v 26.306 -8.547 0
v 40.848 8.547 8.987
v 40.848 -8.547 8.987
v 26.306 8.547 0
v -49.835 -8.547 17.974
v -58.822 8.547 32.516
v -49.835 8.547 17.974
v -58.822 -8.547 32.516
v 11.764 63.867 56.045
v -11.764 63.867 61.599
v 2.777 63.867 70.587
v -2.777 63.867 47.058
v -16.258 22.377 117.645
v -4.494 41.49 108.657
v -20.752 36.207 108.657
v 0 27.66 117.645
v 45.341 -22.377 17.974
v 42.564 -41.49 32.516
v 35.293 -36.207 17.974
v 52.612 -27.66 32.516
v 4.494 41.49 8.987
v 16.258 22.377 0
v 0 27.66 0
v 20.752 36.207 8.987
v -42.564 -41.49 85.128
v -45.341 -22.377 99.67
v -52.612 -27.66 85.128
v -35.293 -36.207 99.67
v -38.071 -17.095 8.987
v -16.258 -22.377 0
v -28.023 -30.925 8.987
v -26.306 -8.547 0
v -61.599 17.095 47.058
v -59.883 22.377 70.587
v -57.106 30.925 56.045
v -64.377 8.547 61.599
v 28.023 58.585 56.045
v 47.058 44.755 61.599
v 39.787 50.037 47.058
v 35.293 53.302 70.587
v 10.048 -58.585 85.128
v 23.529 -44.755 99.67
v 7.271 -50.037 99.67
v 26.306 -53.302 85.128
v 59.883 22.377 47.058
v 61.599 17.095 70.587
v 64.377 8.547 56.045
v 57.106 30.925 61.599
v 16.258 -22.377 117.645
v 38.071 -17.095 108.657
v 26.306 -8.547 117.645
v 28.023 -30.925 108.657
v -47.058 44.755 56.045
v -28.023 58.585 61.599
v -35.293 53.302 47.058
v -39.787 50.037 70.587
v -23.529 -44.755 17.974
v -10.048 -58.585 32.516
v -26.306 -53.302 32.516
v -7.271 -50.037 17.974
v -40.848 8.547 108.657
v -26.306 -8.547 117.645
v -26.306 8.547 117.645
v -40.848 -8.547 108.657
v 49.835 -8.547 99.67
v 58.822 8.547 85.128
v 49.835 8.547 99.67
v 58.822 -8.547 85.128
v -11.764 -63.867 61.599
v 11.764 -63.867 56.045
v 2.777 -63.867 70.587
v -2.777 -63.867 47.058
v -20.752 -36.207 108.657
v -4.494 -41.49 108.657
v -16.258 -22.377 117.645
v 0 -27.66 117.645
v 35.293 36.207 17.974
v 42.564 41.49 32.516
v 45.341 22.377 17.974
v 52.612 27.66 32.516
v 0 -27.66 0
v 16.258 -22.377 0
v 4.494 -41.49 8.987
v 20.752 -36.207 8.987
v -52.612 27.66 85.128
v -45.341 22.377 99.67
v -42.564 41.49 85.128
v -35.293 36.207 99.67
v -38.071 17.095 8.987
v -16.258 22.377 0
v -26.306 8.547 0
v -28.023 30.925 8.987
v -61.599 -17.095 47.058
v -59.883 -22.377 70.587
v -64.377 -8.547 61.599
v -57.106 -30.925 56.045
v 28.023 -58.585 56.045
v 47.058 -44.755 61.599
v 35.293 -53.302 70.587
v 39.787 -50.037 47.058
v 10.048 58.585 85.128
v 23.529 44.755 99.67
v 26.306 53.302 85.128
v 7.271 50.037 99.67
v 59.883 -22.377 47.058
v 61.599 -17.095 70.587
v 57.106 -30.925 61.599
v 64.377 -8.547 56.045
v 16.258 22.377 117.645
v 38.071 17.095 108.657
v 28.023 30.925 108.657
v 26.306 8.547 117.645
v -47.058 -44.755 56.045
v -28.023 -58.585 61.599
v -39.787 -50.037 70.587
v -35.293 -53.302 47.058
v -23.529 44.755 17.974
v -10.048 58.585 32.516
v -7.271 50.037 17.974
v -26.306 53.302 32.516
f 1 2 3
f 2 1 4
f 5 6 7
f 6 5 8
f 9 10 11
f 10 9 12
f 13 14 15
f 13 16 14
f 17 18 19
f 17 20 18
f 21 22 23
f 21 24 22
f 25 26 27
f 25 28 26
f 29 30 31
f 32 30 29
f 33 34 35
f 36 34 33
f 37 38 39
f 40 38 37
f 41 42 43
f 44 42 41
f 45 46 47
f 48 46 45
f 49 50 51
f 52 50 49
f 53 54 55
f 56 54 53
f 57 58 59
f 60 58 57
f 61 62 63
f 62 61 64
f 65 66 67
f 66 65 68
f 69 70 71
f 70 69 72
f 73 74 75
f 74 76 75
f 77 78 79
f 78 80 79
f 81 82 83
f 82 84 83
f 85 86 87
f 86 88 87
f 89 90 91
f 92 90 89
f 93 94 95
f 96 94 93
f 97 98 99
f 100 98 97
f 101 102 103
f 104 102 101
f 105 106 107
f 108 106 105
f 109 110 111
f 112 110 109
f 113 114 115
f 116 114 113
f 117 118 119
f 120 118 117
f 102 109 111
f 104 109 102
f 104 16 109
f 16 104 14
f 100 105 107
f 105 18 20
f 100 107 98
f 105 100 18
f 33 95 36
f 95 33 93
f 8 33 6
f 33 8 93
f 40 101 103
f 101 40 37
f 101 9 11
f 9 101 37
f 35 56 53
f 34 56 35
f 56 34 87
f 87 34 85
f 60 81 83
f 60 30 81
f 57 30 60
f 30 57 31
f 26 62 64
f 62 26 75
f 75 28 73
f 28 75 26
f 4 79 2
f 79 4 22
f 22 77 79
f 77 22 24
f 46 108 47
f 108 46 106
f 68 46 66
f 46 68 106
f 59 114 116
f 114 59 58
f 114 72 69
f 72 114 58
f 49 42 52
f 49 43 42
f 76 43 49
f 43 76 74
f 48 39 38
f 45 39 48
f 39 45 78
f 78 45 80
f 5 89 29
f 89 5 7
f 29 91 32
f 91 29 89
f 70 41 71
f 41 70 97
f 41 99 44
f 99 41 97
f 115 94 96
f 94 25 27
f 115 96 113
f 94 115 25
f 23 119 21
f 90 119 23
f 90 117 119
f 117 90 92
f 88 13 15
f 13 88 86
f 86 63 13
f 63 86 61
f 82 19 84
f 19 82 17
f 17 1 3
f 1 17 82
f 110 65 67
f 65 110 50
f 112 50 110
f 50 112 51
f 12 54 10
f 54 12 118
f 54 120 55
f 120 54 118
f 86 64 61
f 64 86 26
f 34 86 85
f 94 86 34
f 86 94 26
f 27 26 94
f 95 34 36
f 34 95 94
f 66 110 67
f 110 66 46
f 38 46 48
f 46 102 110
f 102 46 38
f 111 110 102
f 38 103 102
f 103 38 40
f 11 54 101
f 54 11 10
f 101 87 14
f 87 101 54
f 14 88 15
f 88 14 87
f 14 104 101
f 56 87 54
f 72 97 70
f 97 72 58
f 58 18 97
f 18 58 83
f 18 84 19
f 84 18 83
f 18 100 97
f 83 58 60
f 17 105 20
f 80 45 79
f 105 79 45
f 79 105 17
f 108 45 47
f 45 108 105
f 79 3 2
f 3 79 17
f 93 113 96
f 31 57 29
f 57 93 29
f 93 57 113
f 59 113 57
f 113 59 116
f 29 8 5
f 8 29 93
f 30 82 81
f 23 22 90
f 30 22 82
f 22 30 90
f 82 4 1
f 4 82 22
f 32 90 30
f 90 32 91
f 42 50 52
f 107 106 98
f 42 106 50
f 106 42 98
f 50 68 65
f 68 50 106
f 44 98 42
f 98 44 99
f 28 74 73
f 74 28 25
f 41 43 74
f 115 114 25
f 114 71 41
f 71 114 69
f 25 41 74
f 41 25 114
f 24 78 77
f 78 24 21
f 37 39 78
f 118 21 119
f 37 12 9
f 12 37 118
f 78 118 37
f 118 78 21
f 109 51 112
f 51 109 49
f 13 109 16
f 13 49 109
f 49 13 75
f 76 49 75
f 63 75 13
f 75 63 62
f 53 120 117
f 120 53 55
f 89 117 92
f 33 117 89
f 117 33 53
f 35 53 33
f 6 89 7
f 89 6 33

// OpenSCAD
// file: numbers.scad
// The number we all love.
gold = (1 + sqrt(5)) / 2;

// Ratio of inner over outer circumscribed radii of the icosahedron.  The
// dodecahedron has the same ratio!
inscribe = sqrt(1/3 + 2/15 * sqrt(5));
// Ratio of face radius to icosahedron radius.
coscribe = sqrt(2/3 - 2/15 * sqrt(5));
// Ratio of dodecahedral mid-edge to vertex radii.  (This is the cosine of half
// the dihedral angle).
dodeca_midscribe = sqrt(1/2 + sqrt(5) / 6);
dodeca_comidscribe = sqrt(1/2 - sqrt(5) / 6);
// Ratio of icosahedral mid-edge to vertex radii.  (This is the cosine of half
// the dihedral angle).
icosa_midscribe = sqrt(1/2 + sqrt(5) / 10);
icosa_comidscribe = sqrt(1/2 - sqrt(5) / 10);

// Relative radii of the icosohedral stellation points.
raw_radius1 = 1;
raw_radius2 = (6 * gold - 3) / 5 * inscribe; // 1.0661408512011674
raw_radius3 = gold * icosa_midscribe;        // 1.3763819204711734
raw_radius4 = sqrt((17 - 4 * gold) / 5);     // 1.451059202444919
raw_radius5 = sqrt(21 + 28 * gold) / 5;      // 1.6285570507046667
raw_radius6 = 3 * inscribe;                  // 2.3839634168752983
raw_radius7 = 1 + 2 * gold;                  // 4.23607
raw_radius8 = sqrt(97 / 5 + 156 / 5 * gold); // 8.359584944780256
assert(abs(raw_radius5 - 1.6285570507046667) < 1e-7);
assert(abs(raw_radius8 - 8.359584944780256) < 1e-7);

// Radius of icosahedron with the vertex definitions we use.
ico_scale = sqrt(2 + gold);
// Actual radii in openscad units of the icosahedral stellation points.
radius1 = ico_scale;
radius2 = raw_radius2 * ico_scale;
radius3 = raw_radius3 * ico_scale;
radius4 = raw_radius4 * ico_scale;
radius5 = raw_radius5 * ico_scale;
radius6 = raw_radius6 * ico_scale;
radius7 = raw_radius7 * ico_scale;
radius8 = raw_radius8 * ico_scale;

identity = [[1,0,0],[0,1,0],[0,0,1]];

// Clockwise around [1,0,gold].
rot5 = [[1/2, gold/2, 1/2/gold],
        [-gold/2, 1/2/gold, 1/2],
        [1/2/gold, -1/2, gold/2]];

rot5_2 = rot5 * rot5;
rot5_3 = rot5_2 * rot5;
rot5_4 = rot5_2 * rot5_2;

rotate5 = [identity, rot5, rot5_2, rot5_3, rot5_4];
// file: stand.scad
// STANDS

// Create a tripod.  This implies that the object is face-up to get the 3-fold
// symmetry about the z-axis.
//
// `strut` is the distance from the z-axis to the support struts, as a fraction
// of radius.  `strut_mm` is the same in mm.  If both are non-zero then they
// are added together.
//
// `length` is the length of the strut, as fraction of radius.  Note that as
// the object is raised 2mm, we also increase the length by 2mm.
//
// `thick` is the radius of the struts.
//
// `base` is the base radius, if larger than the computed one.
//
// `hole` if non-zero is the radius of a circle to remove from the center of the
// base.
//
// `height` is the height of the center of the object, as a ratio of `radius`.
// 2mm is added to this.
module stand_tripod(strut, strut_mm=0, base=0,
                    length=1, height=1, align=[1, 0, 0], hole=0, p=10) {
    stand_generic(
        3, strut, strut_mm, base, length, height, hole, p)
        align_rot(align) faceup() children();
}

module stand_pentapod(strut, strut_mm=0, base=0,
                      length=1, height=1, hole=0, p=10) {
    stand_generic(
        5, strut, strut_mm, base, length, height, hole, p)
        pointup() children();
}

module stand_generic(num, strut, strut_mm=0, base=0,
                     length=1, height=1, hole=0, p=10) {
    if ($piece == p) {
        strut_all = strut * $radius + strut_mm;
        difference() {
            for (i = [1:num]) {
                rotate(i * 360 / num) translate([strut_all, 0, 0])
                    cylinder(r = $stand_diameter / 2, h=$radius * length + 2);
            }
            # translate([0, 0, $radius * height + 2])
                scale($radius) children();
        }
        stand_ring(base, hole, strut_all);
    }
}

module stand_quad(x, y, length=1, height=1, hole=0, knob=false) {
    difference() {
        for (c = [[x, y], [-x, y], [-x, -y], [x, -y]]) {
            translate([c.x * $radius, c.y * $radius, 0])
                cylinder(r = $stand_diameter / 2, h=$radius * length + 2);
        }
        #translate([0, 0, $radius * height + 2])
        scale($radius) children();
    }
    stand_ring(0, 1, norm([x, y]) * $radius);
}

module stand_rhombus(x, y, length=1, height=1) {
    difference() {
        for (c = [[x, 0], [-x, 0], [0, -y], [0, y]])
            translate([c.x * $radius, c.y * $radius, 0])
                cylinder(r = $stand_diameter / 2, h=$radius * length + 2);
        #translate([0, 0, $radius * height + 2])
        scale($radius) children();
    }
    stand_ring(max(x, y), min(x, y), x * $radius);
}

module stand_ring(base, hole, strut_mm) {
    outer = max(base * $radius, abs(strut_mm)) + $stand_diameter / 2;
    inner = min(hole * $radius, abs(strut_mm)) - $stand_diameter / 2;
    rounded_ring(outer, inner, n = $fn * 6);
}

module rounded_ring(outer, inner, height=0, r=2, n=0) {
    rotate_extrude($fn = n ? n : $fn) {
        translate([outer, height]) intersection() {
            circle(r);
            square(r);
        }
        if (inner >= r) translate([inner, height]) intersection() {
                circle(r);
                translate([-r, 0]) square(r);
            }
        if (outer > inner)
            translate([inner, 0]) square([outer - inner, height + r]);
        iinner = inner >= r ? inner - r : inner;
        if (height > 0)
            translate([inner, 0]) square([outer + r - iinner, height]);
    }
}
// main file
use <functions.scad>
use <splitting.scad>
use <stand.scad>
include <numbers.scad>

// Faces are coloured as follows:
// Rhombication squares - green.
// Icosohedral - Yellow.
// Dodecahdral - Magenta.

// Snub triangles - Pink.

// Octohedral - Orange.
// Cubical - Purple.
// Tetrahedral - Lets do red.
// Truncated tetrahedron - red + pink?  Or maybe black for all truncation?

// Index of the object to print.
archimedes = 12;
// Alternatively, you may replace `main();` below with the object you want.

// 0 = raw object, 1, 2... = main printables, 10 = stand.
$piece = 1;

// The overall radius in mm from the center of the piece to its extremities.
$radius = 65.001;
// Many of the dimensions below are scaled by the radius.

// Depth in mm of the hole for post joiners.
$join_depth=5;

// Diameter in mm of the holes for post joiners.
$join_diameter=2.1;
// This should be the diameter of your filament (or whatever you use), plus a
// little.

// Diameter in mm of the stand posts.
// $stand_diameter = 6;

// For stands and joiners.  (Gets multiplied for larger radii).
$fn=20;

// Print pieces face down rather than face-up.
$flip = true;

main();

module main() {
    // 46.9041 gives an edge length of 40.
    if (archimedes == 1) truncated_tetrahedron(); // 50mm
    // Cuboctahedron has inscribe distance of /sqrt(2) for the squares
    // and /sqrt(3/2) for the trianges.  At 50mm, that gives square inscribe
    // radius of 35.3553mm and triangle inscribe 40.8248mm.
    if (archimedes == 2) cuboctahedron(); // 50mm, ins. 35.3553 and 40.8248
    // 52.1005 gives a square inscribe of 35.355.
    if (archimedes == 3) truncated_cube();
    // 52.7045 gives a triangle inscribe of 40.8247
    if (archimedes == 4) truncated_octahedron();
    if (archimedes == 5) rhombi_cuboctahedron(); // 60mm
    // Inscribes: 53.6863 (cube), 58.638 (octohedron), 61.9008 (rhombis)
    if (archimedes == 6) truncated_cuboctahedron(); // 65mm
    if (archimedes == 7) snub_cube();         // 55mm
    // Inscribe 60.7212 for the triangles and 55.2923 for the pentagons.
    if (archimedes == 8) icosidodecahedron(); // 65mm
    // 75mm gives an edge length of 25.2572.
    // 65.9415 gives an decagon inscribe of 55.2923 and edge length 22.2066.
    if (archimedes == 9) truncated_dodecahedron();
    // 66.3659 gives hexagons matching the inscribe of the icosidodecahedron
    // and an edge length of 26.7815.
    if (archimedes == 10) truncated_icosahedron();
    if (archimedes == 11) rhombicosidodecahedron();      // 65mm
    if (archimedes == 12) truncated_icosidodecahedron(); // 90mm
    if (archimedes == 13) snub_dodecahedron();           // 65mm

    // Platonic solids.
    if (archimedes == 21) tetrahedron();
    if (archimedes == 22) plato_cube();
    if (archimedes == 23) octohedron();
    if (archimedes == 24) dodecahedron();
    if (archimedes == 25) icosahedron();

    // 50... for duals.
    if (archimedes == 62) disdyakis_triacontahedron(); // 90mm

    // 101 - 175 for the Skilling numbering of the uniform compounds.
    // 201 - 275 for their duals.
    if (archimedes == 246) two_dodecahedra();
}

// Joiner array item description is [radius,radius_mm,offset,offset_mm] or just
// [radius_mm,offset_mm] with the origin inferred from the signs.
vertical_joiners=[[1, -4, 0, 0], [0, 2.5, 0, 0]];

module truncated_tetrahedron() {
    $join_depth=4;
    a = [3,1,1];
    // Suppress coset reduction on the hexagon.  The order-6 rotation is not
    // in the full rotational symmetry group!
    joiners=[[2.5,4],[-9,-4]];
    face_list = [
        [triangle(a), 4, "grey", 2, [[[2.5,4],[-9,-4]]] ],
        [invert(double(triangle(mz(a)))), -4, "red", 3,
         [[[2.5,-4],[-9,4]], [[-9,4], [-9, -4]]] ]];
    polygon_face_set(face_list, cut = 1 - 14.5 / $radius);
}

module cuboctahedron() {
    p = [0, 1, 1];
    face_list=[
        [zsquare(p), 6, "purple"],
        [triangle(p), 8, "orange"]];

    joiners=[[1, -6.5, -0.5, 10], [1, -6.5, 0.5, -10]];
    polygon_face_set(face_list, joiners=joiners);
}

module truncated_cube() {
    a = [1 + sqrt(2), 1, 1 + sqrt(2)];
    t_joins=[[2.5,  4.7], [-7, -4.7]];
    s_joint=[[2.5, -4.7], [-7,  4.7]];
    s_joins=[[-7, -3], [-7, 3]];
    face_list = [
        [triangle(a), 8, "orange", 3, [t_joins]],
        [octogon(a), 6, "purple", 2, [s_joint, s_joins]]];
    polygon_face_set(face_list);
}

module truncated_octahedron() {
    a = [0, 1, 2];
    face_list = [
        [zsquare(a), 6, "purple"],
        [double(triangle(a)), 8, "orange"]];
    joiners=[[1, -5.5, -0.5, 6], [1, -5.5, 0.5, -6]];
    polygon_face_set(face_list, joiners=joiners);
}


module rhombi_cuboctahedron() {
    a = [1, 1, 1 + sqrt(2)];
    face_list= [
        [triangle(a), 8, "orange"],
        [zsquare(a), 6, "purple"],
        [[a, pls(a), my(pls(a)), my(a)], 12, "green", 4],
        ];
    joiners=[[1, -4.2, -0.5, 10], [1, -4.2, 0.5, -10]];
    polygon_face_set(face_list, joiners=joiners);
}

module truncated_cuboctahedron() {
    q = [1 + sqrt(2), 1, 1 + 2 * sqrt(2)];

    f4 = [q, [q.z, q.y, q.x], [q.z, -q.y, q.x], [q.x, -q.y, q.z]];

    face_list = [
        [f4, 12, "green"],
        [double(triangle(q)), 8, "orange"],
        [octogon(q), 6, "purple"]];

    joiners=[[1, -5.3, -0.5, 6.5], [1, -5.3, 0.5, -6.5], [0, 2.5, 0, 0]];
    polygon_face_set(face_list, joiners=joiners);
}


module snub_cube() {
    function tribo(n, a) = n == 0 ? a : tribo(n - 1, sqrt(1/a + 1 + a));
    t = tribo(22, 1);
    a = [1/t, 1, t];
    face_list=[
        [zsquare(a), 6, "purple"],
        [triangle(a), 8, "orange"],
        [[a, pls(a), rmz(a)], 24, "pink", 4],
        ];
    joiners=[[-5, 10], [-5, -10], [2.5, 0]];
    polygon_face_set(face_list, joiners=joiners);
}

module icosidodecahedron()
{
    q = [gold - 1, 1, gold];

    face_list = [
        [triangle(q), 20, "yellow"],
        [canonvv(pentagon(q)), 12, "magenta"]];

    joiners=[[-5, 10], [-5, -10], [2.5, 0]];
    polygon_face_set(face_list, cut=0.75, joiners=joiners);
}

module truncated_dodecahedron() {
    q = [gold, 2, gold+1];

    face_list = [
        [triangle(q), 20, "yellow"],
        [canonvv(double(pentagon(q))), 12, "magenta"]];

    joiners=[[-5.2, 0], [2.5, 0]];
    polygon_face_set(face_list, joiners=joiners);
}

module truncated_icosahedron() {
    b = [2, gold, 2 * gold + 1];
    joiners=[[-4, -4.8], [-4, 4.8]];
    face_list = [
        [canonvv(pentagon(b)), 12, "magenta", 2],
        [double(triangle(b)), 20, "yellow", 3]];
    polygon_face_set(face_list, cut=0.85, joiners=joiners);
}

module rhombicosidodecahedron() {
    a = [1, 1, 2*gold + 1];

    face_list = [
        [triangle(rot5*a), 20, "yellow"],
        [zsquare(a), 30, "green"],
        [pentagon(a), 12, "magenta"]
        ];

    polygon_face_set(face_list, joiners=vertical_joiners);
}

module truncated_icosidodecahedron() {  // Aka great rhombicosidodecahedron.
    p = [gold-1, gold-1, 3 + gold];

    face_list = [
        [zsquare(p), 30, "green"],
        [canonvv(double(triangle(rot5*p))), 20, "yellow"],
        [canonvv(double(pentagon(p))), 12, "magenta"]];
    polygon_face_set(face_list);
}


// For this guy we give up on canonicalisation and cosets.
module snub_dodecahedron() {
    // ξ ≈ 0.94315125924 from wikipedia.
    epsilon = 0.94315125924;
    p = [
        -gold*gold*gold + gold * epsilon + 2 * gold * epsilon * epsilon,
        (gold + 1) * (1 - epsilon),
        epsilon
        ];

    face_list = [
        [pentagon(p), -12, "magenta"],
        [[p, rz(p), rz(rot5_4 * p)], -60, "pink", 2],
        [triangle(rot5*p), -20, "yellow"]
        ];

    joiners=[[1, -3.5, 0, 0], [0, 2.5, 0, 0]];
    polygon_face_set(face_list, joiners=joiners);
}

module tetrahedron() {
    $join_depth = 4;
    p = [1,1,-1];
    face_list = [[triangle(p), 4, "red", 2]];
    joiners=[[-13.25, 6.5], [-13.25, -6.5]];
    polygon_face_set(face_list, cut=0.7, joiners=joiners);

    if ($piece == 10) {                 // Stand.
        stand_diameter = 10;
        echo($radius * sqrt(8/3));
        target = $radius * sqrt(2)/3 + 0.2;
        sr = stand_diameter / 2;
        arc_radius = target * 2 - sr;
        difference() {
            for (a = [-90, -210, 30]) rotate(a) {
                    rotate([0,90,0]) translate([-arc_radius, -arc_radius-sr, 0])
                        rotate_extrude(angle=150, $fn=$fn * 10)
                        translate([arc_radius, 0])
                        circle(stand_diameter / 2);
                    translate([0, target - arc_radius - sr,
                               sqrt(3) * target + arc_radius])
                        sphere(stand_diameter, $fn=$fn * 5);
                    translate([0, -arc_radius-sr, 0]) sphere(sr, $fn=$fn*2);
                }
            translate([0, 0, sqrt(3) * target + arc_radius]) {
                linear_extrude(10) circle($radius * sqrt(8) / 3, $fn = 3);
            }
            translate([0,0,-sr])
                cube([5 * target, 5 * target, stand_diameter], center=true);
        }
        rounded_ring(outer=arc_radius+sr, inner=arc_radius-sr, n=$fn*5);
    }
    if ($piece == 11) {
        stand_diameter = 8;
        gap = 0.4;
        target = $radius * sqrt(2)/3 + 0.2 - gap;
        angle = 75;
        difference() {
            for (a = [60, 180, -60])
                rotate(a) bent_dumbell(target, stand_diameter, angle, gap);
            translate([0,0,-stand_diameter])
                cube([3 * target, 3 * target, 2 *stand_diameter], center=true);
            translate([0,0, bd_height(target, stand_diameter, angle, gap)])
                linear_extrude(stand_diameter)
                circle($radius * sqrt(8) / 3, $fn = 3);
        }
    }
    module bent_dumbell(target, stand_diameter, angle, gap) {
        c = cos(angle);
        s = sin(angle);
        sr = stand_diameter / 2;
        outer_radius = target / (1 - c);
        mid_radius = outer_radius - sr;
        translate([outer_radius + gap, 0, outer_radius * s])
        rotate([90,0,0]) rotate(180-angle) {
            rotate_extrude(angle=angle*2, $fn=$fn*10)
                translate([mid_radius, 0]) circle(sr);
            translate([outer_radius, 0, 0]) sphere(stand_diameter, $fn=$fn*5);
            rotate(angle*2)
                translate([outer_radius, 0, 0]) sphere(stand_diameter, $fn=$fn*5);
        }
    }
    function bd_height(target, stand_diameter, angle, gap) =
        2 * sin(angle) * target / (1 - cos(angle));
}

module plato_cube() {
    p = [1,1,1];
    face_list = [[zsquare(p), 6, "green", 2]];
    joiners=[[-9, 6], [-9, -6]];
    polygon_face_set(face_list, joiners=joiners);
}

module octohedron() {
    p = [0,0,1];
    face_list = [[triangle(p), 8, "orange", 2]];
    joiners = [[-7.5, 9], [-7.5, -9]];
    polygon_face_set(face_list, joiners=joiners);
}

module dodecahedron() {
    p = [0,gold-1,gold];
    face_list = [[pentagon(p), 12, "magenta", 2]];
    joiners = [[-5, 5], [-5, -5]];
    polygon_face_set(face_list, joiners=joiners);
}

module icosahedron() {
    p = [1,0,gold];
    face_list = [[triangle(p), 20, "yellow", 2]];
    joiners = [[-4.5, 10], [-4.5, -10]];
    polygon_face_set(face_list, joiners=joiners);
}

module disdyakis_triacontahedron() {
    p = [0, 0, 1];
    q = [1, 0, gold] / norm([1, gold]);
    r = [0, gold-1, gold] / norm([gold-1, gold]);
    c = [gold-1, gold-1, gold+3] / norm([gold-1, gold-1, gold+3]);;
    if ($piece == 11) {
        for (v = sixty([p])) translate(v[0]) color("lightgreen") sphere(0.025);
        for (v = twelve([q])) translate(v[0]) color("magenta") sphere(0.025);
        for (v = twenty([r])) translate(v[0]) color("yellow") sphere(0.025);
        for (v = onetwenty([c])) translate(v[0]) color("black") sphere(0.025);
        color("#ffffee", 0.75) sphere(0.9, $fn=100);
        translate(p) color("lightgreen") sphere(0.05);
        translate(q) color("magenta") sphere(0.05);
        translate(r) color("yellow") sphere(0.05);
    }
    face_list = [[[r, q, p], 60, "white", 2],
                 [[p, q, my(r)], 60, "black", 3]];
    polygon_face_set(face_list);
}

module two_dodecahedra() {
    A = [for (r = rotate5) canonv(r * [0, gold-1, gold])];
    factor = $radius / sqrt(3);
    if ($piece == 1) {
        scale(1 / sqrt(3)) twelve() pyramid(A);
        color("red") rotate(90) scale(1 / sqrt(3)) twelve() pyramid(A);
        scale(1/sqrt(3)) {
            color("black") translate([1,-1,1]) sphere(0.1);
            color("black") translate([1,1,1]) sphere(0.1);
            color("black") translate([0,0,gold]) sphere(0.1);
            color("blue") translate([gold-1,0,gold]) sphere(0.1);
        }
    }
    if ($piece == 2) {
        p = factor * [0,0,gold];
        q1 = factor * [1,1,1];
        q2 = factor * [1, -1, 1];
        apex = factor * [gold - 1, 0, gold];
        intersection() {
            translate([2 - $radius * 0.65, 0, 0])
                verticate(cross(q2, q1))
                trapezohedron_uncut([p, q1, q2], apex,
                                    // cut_radius = $radius * 0.68 - 2,
                                    joiners=[
                                        [[-3, 16], [-3, -16]],
                                        [[-5.5, 19], [-5.5, -19]],
                                        [[-3, 16], [-3, -16]],
                                        ]
                    );
            translate([$radius, 0, 0]) cube(2 * $radius, center=true);
        }
    }
}

module joinable_frustum(w, cut=0.75, joiners, colour) {
    mean = sum(w) / len(w);
    w_inscribe = norm(mean);
    flipper = $flip
        ? [[1, 0, 0], [0, 1, 0], [0, 0, -1, w_inscribe * (1 - cut)]]
        : [[1, 0, 0], [0, 1, 0], [0, 0, 1]];

    multmatrix(flipper) difference() {
        translate([0, 0, -cut * w_inscribe]) verticate_align(w) difference() {
            color(colour) chamfer_pyramid(w);
            for (i = [1:len(w)]) {
                for (j = joiners[i % len(joiners)]) {
                    v   = len(j) == 4 ? j[0] : 0.5 - 0.5 * sign(j[0]);
                    vmm = len(j) == 4 ? j[1] : j[0];
                    h   = len(j) == 4 ? j[2] : -0.5 * sign(j[1]);
                    hmm = len(j) == 4 ? j[3] : j[1];
                    mid_vertex_joiner_post(
                        w[i-1], w[i%len(w)],
                        radius=cut + v * (1 - cut), radius_mm=vmm,
                        offset=h, offset_mm=hmm);
                }
            }
        }
        translate([0, 0, -$radius]) cube(2*$radius, center=true);
    }
}

module polygon_face_set(faces, cut=0.75,
                        joiners=vertical_joiners,
                        modulo_joiners=undef) {
    big_face = max([for (f = faces) [len(f[0]), f[0]]]);
    vertical = sum(big_face[1]) / big_face[0];
    if ($piece == 0)
        scale(1 / norm(faces[0][0][0])) polygon_face_all(faces);

    if ($piece == 1)
        scale($radius / norm(faces[0][0][0]))
            // Bring the nominated vertical to the bottom (not top!) and
            // sit on it!
            translate([0, 0, norm(vertical)]) verticate(-vertical)
            polygon_face_all(faces);

    for (f = faces) {
        face = f[0];
        p = len(f) <= 3 ? len(face) % 2 == 0 ? len(face) / 2 : len(face) : f[3];
        j = len(f) <= 4 ? [joiners] : f[4];
        if ($piece == p)
            joinable_frustum($radius / norm(face[0]) * face, cut, j, f[2]);
    }
}

module polygon_face_all(faces) {
    for (f = faces) color(f[2]) polygon_faces(f[0], f[1]);
}

module polygon_faces(face, copies) {
    total = copies * len(face);
    echo("Total", total, "from", copies, "of", len(face));
    echo("Edge length", $radius * norm(face[1] - face[0]) / norm(face[0]));
    echo("Inscribe", $radius * norm(sum(face)) / len(face) / norm(face[0]));
    // If it's sensible to do coset reduction, then just do it.
    if (total == 120)
        pyramids(coset(canonvvv(onetwenty(face))));
    else if (total == 60)
        pyramids(coset(canonvvv(sixty(face))));
    else if (total == 24)
        pyramids(coset(twentyfour(face)));
    else if (copies == 24)
        pyramids(twentyfour(face));
    else if (abs(copies) == 60)
        pyramids(sixty(face));
    else if (abs(copies) == 20)
        pyramids(twenty(face));
    else if (abs(copies) == 12)
        pyramids(twelve(face));
    else if (copies == 8)
        pyramids(eight(face));
    else if (copies == 6)
        pyramids(six(face));
    else if (abs(copies) == 4)
        pyramids(four(face));
    else if (copies == 1)
        pyramid(face);
    else
        assert(false);
}
